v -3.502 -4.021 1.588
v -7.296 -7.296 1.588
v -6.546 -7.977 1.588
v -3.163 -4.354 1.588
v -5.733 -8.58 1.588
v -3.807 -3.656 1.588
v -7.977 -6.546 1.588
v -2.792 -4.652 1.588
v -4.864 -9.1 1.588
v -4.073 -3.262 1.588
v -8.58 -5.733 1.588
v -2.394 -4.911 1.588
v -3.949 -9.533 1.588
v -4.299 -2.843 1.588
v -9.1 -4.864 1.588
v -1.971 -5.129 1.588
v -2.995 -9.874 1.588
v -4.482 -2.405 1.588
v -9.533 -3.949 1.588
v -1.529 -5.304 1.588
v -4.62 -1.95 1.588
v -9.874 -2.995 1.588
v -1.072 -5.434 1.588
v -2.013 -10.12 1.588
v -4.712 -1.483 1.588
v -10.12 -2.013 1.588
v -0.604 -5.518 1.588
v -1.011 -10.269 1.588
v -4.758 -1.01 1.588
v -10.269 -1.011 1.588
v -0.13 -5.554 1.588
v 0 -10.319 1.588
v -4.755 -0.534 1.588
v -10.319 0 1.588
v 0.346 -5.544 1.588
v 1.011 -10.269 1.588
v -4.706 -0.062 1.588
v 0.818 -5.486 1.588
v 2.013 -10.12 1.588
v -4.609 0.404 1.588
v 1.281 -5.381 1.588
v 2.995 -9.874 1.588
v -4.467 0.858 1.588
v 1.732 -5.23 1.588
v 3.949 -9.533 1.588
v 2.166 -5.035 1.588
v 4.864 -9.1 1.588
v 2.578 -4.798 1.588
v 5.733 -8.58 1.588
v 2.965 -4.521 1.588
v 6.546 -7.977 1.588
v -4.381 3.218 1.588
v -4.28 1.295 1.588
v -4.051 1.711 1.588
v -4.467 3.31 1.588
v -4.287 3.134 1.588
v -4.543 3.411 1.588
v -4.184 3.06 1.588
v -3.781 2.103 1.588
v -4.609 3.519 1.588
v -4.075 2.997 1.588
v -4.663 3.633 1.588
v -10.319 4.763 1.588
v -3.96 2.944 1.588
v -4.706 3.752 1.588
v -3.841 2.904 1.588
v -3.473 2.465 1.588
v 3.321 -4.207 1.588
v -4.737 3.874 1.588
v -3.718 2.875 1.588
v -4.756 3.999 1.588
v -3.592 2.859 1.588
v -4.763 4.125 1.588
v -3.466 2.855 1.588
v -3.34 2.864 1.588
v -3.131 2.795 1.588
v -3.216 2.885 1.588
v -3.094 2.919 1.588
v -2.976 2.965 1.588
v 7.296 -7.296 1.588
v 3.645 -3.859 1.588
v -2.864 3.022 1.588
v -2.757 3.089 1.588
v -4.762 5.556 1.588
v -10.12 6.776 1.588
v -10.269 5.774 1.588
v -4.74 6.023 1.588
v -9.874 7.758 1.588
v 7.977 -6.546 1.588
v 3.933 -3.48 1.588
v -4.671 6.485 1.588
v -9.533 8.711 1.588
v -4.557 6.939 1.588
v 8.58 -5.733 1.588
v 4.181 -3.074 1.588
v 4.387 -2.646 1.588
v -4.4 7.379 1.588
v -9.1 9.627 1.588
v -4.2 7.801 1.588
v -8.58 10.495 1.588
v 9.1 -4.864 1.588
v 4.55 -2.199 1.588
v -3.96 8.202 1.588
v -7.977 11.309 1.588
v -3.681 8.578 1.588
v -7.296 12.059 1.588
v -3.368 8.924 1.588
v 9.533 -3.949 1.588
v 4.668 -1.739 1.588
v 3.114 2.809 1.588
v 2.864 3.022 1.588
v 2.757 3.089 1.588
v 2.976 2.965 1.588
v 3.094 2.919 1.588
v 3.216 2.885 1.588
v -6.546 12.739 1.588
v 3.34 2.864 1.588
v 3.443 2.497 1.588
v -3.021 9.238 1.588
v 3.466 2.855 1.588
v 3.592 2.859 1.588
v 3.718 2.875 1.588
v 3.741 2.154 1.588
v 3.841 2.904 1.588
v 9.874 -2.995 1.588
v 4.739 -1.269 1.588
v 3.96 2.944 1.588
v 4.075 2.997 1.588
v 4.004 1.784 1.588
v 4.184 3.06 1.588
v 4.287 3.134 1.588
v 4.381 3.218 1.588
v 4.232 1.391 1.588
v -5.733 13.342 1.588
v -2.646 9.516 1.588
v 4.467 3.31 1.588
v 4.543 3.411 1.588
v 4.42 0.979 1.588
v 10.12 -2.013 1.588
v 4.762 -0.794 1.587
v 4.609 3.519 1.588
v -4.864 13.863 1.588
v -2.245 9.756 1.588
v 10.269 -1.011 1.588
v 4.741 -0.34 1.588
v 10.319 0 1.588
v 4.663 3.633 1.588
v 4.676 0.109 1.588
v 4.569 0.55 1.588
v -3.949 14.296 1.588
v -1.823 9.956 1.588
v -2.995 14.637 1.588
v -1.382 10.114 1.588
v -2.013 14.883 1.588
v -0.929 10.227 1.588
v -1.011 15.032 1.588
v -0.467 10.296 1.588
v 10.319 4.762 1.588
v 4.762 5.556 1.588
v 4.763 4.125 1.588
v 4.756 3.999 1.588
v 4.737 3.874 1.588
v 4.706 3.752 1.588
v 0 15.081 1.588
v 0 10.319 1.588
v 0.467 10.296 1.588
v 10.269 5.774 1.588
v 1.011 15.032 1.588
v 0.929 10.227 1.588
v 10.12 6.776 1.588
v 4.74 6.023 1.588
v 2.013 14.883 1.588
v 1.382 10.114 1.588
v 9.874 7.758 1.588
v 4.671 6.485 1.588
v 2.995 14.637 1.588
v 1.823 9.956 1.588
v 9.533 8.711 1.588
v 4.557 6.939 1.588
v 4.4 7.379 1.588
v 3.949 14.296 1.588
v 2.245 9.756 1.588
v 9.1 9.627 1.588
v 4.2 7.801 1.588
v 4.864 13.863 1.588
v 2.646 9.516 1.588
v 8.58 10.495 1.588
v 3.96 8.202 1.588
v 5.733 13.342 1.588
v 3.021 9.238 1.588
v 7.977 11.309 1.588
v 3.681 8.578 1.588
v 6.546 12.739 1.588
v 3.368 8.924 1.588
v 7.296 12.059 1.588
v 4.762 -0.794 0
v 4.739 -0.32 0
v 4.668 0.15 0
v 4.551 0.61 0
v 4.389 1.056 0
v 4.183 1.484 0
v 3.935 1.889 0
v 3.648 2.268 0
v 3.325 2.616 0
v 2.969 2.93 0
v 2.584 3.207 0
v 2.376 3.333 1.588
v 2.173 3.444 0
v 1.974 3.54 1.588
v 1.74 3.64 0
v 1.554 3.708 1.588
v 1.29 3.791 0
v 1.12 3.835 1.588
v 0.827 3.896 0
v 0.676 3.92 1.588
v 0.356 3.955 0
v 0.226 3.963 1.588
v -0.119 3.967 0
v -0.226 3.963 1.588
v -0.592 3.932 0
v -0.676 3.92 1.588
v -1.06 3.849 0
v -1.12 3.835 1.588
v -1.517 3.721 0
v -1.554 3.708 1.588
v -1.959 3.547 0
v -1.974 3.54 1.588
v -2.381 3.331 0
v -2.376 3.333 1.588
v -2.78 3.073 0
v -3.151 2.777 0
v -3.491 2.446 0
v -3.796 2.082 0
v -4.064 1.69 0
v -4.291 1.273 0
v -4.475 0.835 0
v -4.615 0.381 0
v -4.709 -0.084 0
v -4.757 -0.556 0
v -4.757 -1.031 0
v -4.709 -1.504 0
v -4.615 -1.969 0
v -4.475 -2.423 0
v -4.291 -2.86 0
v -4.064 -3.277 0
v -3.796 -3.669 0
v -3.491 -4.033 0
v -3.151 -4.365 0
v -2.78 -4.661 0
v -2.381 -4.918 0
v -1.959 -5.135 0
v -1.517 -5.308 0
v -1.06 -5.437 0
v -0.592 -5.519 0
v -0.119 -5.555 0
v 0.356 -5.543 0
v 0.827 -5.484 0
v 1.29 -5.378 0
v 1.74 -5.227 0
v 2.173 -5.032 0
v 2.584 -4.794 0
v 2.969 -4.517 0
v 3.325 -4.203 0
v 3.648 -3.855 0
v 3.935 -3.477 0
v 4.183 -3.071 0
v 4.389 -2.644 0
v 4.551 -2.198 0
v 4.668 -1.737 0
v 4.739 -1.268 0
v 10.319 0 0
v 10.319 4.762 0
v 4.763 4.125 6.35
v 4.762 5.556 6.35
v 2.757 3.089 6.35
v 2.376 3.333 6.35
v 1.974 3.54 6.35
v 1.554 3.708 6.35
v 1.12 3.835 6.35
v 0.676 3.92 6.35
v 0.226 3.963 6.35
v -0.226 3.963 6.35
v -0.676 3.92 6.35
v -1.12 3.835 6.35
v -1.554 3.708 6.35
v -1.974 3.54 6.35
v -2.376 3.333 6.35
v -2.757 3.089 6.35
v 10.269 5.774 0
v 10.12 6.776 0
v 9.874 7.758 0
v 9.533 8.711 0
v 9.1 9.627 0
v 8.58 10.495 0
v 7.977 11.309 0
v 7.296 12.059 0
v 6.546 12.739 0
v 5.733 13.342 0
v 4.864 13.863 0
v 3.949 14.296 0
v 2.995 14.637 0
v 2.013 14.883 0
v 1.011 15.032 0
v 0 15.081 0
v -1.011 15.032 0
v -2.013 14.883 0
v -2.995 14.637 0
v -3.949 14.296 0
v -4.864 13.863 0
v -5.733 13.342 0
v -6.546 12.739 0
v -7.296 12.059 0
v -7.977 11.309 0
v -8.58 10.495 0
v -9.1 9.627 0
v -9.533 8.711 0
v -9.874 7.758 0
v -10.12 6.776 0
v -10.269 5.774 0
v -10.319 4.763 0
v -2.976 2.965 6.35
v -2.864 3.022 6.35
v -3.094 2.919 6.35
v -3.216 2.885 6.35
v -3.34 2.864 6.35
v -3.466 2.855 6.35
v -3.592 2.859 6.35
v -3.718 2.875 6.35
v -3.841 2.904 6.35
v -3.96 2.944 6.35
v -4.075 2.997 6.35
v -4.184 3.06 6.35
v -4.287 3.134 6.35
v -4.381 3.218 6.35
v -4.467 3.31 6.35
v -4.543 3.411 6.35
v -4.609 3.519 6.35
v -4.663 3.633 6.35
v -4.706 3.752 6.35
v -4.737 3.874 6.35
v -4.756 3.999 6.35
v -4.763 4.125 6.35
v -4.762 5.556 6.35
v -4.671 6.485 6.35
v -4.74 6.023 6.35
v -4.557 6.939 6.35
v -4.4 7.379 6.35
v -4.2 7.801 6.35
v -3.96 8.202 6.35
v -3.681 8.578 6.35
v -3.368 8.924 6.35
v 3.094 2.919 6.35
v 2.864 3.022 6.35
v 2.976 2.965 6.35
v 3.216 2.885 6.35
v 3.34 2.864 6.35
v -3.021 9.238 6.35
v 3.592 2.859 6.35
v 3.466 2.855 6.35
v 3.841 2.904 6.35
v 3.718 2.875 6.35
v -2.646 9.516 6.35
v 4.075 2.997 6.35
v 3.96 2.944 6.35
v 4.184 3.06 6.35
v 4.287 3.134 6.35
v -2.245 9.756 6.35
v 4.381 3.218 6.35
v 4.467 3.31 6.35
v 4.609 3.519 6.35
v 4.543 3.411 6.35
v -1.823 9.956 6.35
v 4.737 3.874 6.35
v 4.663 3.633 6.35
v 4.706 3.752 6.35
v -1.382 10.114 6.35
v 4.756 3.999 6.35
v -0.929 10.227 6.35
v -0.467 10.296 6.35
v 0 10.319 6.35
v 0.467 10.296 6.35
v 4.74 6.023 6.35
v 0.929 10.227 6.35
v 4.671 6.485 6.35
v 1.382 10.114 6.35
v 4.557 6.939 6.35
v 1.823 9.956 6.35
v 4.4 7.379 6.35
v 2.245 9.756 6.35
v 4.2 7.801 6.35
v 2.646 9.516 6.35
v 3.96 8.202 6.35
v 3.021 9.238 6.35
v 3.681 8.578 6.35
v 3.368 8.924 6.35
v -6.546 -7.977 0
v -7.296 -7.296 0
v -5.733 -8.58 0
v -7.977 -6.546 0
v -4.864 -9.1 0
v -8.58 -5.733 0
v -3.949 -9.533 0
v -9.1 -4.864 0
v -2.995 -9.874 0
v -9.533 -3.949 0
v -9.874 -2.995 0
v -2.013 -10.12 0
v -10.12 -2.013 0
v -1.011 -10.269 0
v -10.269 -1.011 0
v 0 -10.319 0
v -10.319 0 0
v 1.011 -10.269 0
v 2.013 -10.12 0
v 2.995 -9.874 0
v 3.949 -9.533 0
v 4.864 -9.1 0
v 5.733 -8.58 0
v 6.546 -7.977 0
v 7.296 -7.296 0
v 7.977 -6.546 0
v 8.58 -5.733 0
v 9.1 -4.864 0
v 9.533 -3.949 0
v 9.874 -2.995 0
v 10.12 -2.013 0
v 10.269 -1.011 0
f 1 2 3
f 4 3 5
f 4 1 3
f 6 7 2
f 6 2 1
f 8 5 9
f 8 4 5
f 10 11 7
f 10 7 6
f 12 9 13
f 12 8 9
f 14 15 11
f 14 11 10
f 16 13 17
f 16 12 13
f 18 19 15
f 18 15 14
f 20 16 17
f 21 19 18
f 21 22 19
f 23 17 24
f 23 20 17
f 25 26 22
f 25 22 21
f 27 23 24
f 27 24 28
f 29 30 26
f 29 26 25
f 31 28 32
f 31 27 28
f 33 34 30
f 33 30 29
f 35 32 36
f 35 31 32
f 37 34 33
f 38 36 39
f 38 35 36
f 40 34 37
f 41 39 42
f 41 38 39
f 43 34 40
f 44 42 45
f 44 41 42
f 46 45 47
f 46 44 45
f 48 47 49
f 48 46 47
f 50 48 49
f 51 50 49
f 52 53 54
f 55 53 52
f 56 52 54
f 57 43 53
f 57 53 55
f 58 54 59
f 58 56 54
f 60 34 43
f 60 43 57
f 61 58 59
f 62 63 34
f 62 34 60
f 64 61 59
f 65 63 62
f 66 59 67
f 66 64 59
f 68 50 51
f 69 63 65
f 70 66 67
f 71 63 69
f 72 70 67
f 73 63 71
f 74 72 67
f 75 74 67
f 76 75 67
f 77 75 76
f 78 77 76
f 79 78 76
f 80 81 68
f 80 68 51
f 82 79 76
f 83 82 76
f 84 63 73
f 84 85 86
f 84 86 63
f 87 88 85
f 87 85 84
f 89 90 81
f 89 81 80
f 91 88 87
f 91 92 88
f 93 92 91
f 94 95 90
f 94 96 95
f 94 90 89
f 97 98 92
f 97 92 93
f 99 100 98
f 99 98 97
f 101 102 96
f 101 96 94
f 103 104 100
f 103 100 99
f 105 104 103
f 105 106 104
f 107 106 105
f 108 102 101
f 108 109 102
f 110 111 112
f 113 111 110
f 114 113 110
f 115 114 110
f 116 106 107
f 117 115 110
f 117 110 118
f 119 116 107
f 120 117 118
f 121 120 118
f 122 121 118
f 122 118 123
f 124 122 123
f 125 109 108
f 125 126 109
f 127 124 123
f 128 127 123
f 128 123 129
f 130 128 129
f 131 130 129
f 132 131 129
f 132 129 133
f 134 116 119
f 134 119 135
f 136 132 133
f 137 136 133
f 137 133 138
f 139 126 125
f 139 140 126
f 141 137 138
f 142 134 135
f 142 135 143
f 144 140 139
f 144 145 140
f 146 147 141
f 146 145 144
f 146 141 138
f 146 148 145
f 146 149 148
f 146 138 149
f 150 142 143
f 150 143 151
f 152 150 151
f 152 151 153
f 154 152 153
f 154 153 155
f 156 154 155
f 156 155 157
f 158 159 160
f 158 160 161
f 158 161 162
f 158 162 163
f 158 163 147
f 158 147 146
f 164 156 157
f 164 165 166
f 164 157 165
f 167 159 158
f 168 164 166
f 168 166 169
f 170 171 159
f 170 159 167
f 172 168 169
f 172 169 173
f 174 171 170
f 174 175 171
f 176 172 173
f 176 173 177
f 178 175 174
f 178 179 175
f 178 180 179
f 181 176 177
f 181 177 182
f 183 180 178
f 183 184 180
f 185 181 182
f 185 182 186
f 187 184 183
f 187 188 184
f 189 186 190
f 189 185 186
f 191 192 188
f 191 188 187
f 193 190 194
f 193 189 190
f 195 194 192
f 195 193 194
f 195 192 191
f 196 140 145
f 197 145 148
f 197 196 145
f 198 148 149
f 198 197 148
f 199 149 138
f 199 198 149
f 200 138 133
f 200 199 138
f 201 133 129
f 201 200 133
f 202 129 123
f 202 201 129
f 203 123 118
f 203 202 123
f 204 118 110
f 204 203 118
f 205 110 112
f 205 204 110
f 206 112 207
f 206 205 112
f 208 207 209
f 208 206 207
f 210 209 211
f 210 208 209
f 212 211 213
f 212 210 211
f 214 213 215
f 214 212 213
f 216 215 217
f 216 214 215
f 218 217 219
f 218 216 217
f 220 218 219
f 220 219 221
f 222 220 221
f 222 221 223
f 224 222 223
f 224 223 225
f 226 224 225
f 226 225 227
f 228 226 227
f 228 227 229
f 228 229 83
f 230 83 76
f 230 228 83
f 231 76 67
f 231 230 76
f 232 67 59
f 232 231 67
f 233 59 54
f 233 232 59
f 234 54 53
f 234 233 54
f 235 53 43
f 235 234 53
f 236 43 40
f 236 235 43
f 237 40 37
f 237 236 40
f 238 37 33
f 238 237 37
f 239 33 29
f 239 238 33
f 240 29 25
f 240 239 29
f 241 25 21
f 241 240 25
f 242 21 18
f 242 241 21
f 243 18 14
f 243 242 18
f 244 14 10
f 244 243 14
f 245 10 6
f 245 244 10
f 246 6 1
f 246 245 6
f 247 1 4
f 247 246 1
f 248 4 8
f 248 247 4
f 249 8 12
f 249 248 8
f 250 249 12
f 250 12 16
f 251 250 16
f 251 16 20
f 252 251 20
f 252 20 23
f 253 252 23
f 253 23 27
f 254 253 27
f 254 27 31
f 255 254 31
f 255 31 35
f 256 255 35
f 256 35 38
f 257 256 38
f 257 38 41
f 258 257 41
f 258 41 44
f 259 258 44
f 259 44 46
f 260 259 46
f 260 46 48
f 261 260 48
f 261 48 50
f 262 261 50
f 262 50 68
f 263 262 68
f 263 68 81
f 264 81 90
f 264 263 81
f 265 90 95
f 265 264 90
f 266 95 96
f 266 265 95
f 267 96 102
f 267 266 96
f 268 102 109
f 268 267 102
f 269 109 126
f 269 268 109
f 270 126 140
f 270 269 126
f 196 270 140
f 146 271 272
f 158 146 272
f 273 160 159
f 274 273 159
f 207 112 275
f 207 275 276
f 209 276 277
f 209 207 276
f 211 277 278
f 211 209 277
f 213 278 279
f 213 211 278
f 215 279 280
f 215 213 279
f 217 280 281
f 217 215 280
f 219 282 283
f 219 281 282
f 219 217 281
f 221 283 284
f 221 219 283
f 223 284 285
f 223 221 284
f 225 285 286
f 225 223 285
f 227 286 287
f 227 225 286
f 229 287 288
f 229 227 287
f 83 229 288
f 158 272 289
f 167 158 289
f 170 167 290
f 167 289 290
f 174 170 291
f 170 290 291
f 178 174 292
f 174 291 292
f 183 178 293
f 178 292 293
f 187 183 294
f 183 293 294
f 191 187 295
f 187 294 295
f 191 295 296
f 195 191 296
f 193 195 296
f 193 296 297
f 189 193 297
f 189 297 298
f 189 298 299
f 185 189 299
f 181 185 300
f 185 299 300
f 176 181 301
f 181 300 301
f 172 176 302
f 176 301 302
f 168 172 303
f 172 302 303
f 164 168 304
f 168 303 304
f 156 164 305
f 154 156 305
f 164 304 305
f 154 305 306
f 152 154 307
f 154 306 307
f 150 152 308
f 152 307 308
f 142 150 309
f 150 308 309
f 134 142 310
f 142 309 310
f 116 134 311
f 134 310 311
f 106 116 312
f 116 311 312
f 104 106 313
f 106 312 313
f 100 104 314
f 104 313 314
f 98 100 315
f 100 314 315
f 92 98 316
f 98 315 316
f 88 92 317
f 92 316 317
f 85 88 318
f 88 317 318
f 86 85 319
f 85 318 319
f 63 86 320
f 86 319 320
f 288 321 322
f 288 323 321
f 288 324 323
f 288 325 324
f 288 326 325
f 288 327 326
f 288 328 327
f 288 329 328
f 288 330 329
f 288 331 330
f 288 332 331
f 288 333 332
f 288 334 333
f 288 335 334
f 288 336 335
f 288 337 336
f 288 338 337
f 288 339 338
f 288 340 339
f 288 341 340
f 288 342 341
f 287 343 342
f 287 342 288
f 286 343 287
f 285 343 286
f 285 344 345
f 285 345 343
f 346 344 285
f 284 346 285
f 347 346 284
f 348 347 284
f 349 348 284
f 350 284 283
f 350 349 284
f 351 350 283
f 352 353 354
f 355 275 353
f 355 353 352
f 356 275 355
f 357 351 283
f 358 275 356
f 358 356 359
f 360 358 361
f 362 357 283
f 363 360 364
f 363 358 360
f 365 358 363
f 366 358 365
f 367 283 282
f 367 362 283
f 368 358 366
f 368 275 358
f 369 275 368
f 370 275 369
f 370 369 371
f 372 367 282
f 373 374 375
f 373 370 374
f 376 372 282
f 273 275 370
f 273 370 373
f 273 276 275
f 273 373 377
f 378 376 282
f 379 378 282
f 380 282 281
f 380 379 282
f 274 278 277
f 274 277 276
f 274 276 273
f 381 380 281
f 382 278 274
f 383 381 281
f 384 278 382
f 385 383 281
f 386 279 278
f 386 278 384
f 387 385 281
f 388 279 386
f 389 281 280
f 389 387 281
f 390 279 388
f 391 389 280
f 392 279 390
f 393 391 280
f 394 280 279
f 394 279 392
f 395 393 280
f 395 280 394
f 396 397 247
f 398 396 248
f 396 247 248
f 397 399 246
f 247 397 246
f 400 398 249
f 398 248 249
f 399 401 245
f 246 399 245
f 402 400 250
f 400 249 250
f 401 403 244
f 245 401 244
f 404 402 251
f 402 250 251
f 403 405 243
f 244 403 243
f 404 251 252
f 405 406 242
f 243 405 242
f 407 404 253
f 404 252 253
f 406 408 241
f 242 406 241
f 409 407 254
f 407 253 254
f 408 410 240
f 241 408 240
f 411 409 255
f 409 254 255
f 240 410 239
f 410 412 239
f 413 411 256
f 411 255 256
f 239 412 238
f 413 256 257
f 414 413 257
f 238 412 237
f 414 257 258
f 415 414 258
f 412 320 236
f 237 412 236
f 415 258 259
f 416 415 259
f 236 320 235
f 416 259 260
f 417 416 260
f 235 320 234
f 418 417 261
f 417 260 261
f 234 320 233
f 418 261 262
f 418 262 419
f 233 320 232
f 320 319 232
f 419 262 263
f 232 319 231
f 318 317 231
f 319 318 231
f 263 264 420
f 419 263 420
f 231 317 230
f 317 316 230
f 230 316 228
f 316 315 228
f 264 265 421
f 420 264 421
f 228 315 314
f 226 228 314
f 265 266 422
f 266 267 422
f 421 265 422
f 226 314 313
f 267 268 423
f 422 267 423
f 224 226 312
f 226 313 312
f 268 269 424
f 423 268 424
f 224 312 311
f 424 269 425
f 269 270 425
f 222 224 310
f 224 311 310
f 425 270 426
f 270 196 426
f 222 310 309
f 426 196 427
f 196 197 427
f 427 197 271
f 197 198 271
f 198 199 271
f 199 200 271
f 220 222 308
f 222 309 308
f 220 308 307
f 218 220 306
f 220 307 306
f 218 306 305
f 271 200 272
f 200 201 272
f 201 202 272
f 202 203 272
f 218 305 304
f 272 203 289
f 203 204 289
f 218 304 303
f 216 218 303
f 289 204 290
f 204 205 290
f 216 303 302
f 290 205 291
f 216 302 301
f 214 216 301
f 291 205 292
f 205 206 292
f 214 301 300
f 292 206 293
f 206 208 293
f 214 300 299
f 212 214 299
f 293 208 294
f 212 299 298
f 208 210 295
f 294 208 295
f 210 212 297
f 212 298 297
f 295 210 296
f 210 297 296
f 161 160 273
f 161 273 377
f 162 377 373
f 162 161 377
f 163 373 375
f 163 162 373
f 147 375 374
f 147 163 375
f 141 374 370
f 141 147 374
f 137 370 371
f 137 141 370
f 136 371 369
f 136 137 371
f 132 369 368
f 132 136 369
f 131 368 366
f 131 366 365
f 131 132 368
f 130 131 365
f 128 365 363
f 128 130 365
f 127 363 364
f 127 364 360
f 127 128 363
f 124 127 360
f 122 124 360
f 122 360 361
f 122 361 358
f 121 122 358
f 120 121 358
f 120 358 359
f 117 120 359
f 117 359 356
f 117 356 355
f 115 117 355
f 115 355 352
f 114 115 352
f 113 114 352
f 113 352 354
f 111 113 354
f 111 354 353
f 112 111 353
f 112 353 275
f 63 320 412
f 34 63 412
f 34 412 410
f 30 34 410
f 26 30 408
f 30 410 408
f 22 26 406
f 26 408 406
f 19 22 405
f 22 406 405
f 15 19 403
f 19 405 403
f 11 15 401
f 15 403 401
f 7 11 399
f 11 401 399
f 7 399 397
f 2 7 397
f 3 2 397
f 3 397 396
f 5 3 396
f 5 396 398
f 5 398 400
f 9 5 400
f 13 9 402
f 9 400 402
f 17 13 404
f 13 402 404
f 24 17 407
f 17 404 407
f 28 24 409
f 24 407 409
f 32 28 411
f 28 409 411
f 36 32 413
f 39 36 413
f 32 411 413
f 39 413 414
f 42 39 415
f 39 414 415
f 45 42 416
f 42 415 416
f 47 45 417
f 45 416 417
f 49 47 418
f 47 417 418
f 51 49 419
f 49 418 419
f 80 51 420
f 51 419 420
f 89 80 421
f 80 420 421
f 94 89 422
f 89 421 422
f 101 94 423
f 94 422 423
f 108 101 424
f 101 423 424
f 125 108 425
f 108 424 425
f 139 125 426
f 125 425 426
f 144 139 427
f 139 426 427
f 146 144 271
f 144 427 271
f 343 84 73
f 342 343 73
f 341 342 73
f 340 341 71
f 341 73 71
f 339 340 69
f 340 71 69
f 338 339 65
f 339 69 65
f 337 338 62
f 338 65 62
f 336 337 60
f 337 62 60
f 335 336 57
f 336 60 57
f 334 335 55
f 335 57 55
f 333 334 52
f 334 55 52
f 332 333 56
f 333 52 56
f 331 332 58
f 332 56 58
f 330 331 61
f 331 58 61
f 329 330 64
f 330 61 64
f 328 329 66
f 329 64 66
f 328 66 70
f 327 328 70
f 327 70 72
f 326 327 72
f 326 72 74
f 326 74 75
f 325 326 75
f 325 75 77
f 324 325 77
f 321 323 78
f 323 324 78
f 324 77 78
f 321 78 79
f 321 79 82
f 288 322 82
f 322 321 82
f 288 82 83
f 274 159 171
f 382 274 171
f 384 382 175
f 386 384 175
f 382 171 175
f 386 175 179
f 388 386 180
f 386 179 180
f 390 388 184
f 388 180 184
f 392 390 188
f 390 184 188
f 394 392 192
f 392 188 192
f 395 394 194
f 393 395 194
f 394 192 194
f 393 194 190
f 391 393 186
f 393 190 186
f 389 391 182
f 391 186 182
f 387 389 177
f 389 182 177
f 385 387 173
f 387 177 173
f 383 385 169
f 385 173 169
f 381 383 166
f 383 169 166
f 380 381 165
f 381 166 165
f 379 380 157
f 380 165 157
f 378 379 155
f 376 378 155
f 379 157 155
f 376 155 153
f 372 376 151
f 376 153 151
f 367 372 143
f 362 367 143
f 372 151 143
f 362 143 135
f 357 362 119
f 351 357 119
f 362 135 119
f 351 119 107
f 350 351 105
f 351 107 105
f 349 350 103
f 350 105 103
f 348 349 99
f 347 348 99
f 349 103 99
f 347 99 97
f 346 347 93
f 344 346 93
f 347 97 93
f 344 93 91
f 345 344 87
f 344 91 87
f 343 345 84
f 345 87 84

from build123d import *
from build123d import SkipClean  # not in build123d's __all__

# Parameters (mm, degrees)
F0_R        = 4.7625
F1_DEPTH    = 1.5875
F3_DEPTH    = 4.7625
F4_T1_DEPTH = 17.0592221242


# Not quite as in the source:
# - a fillet or chamfer that OpenCascade refuses, or shapes differently, is made with other operations: its cross-section is extruded or revolved along the edge and cut away or added


with BuildPart() as f1:
    # F0 (on Top) → F1 (new body)
    with BuildSketch(Plane.XY):
        with BuildLine():
            Line((-10.31875, 4.7625), (-10.31875, 0))
            ThreePointArc((-10.31875, 0), (0, -10.31875), (10.31875, 0))
            Line((10.31875, 0), (10.31875, 4.7625))
            ThreePointArc((10.31875, 4.7625), (0, 15.08125), (-10.31875, 4.7625))
        make_face()
        with Locations((0, -0.79375)):
            Circle(F0_R, mode=Mode.SUBTRACT)
    extrude(amount=F1_DEPTH)

    # F2 (on face) → F3 (join)
    with BuildSketch(Plane.XY.offset(1.5875)):
        with BuildLine():
            ThreePointArc((-4.7625, -0.79375), (0, 3.96875), (4.7625, -0.79375))
            Line((4.7625, -0.79375), (4.7625, 5.55625))
            ThreePointArc((4.7625, 5.55625), (0, 10.31875), (-4.7625, 5.55625))
            Line((-4.7625, 5.55625), (-4.7625, -0.79375))
        make_face()
    with SkipClean():  # cleaning this boolean's faces spoils the solid; the shape is the same uncleaned
        extrude(amount=F3_DEPTH)

    # F4: fillet of radius 1.27 on 2 edges, made by hand

    # F4_s2 → F4_t1 (cut)
    with BuildSketch(Plane.XY.offset(1.5875)):
        with BuildLine():
            ThreePointArc((4.7625, 4.1249388497), (4.075215964, 2.9965142376), (2.7572368421, 3.0894254076))
            ThreePointArc((2.7572368421, 3.0894254076), (4.2315922955, 1.3914348651), (4.7625, -0.79375))
            Line((4.7625, -0.79375), (4.7625, 4.1249388497))
        make_face()
        with BuildLine():
            ThreePointArc((-4.7625, 4.1249388497), (-4.075215964, 2.9965142376), (-2.7572368421, 3.0894254076))
            ThreePointArc((-2.7572368421, 3.0894254076), (-4.2315922955, 1.3914348651), (-4.7625, -0.79375))
            Line((-4.7625, -0.79375), (-4.7625, 4.1249388497))
        make_face()
    extrude(amount=F4_T1_DEPTH, mode=Mode.SUBTRACT)


solid = f1.part
